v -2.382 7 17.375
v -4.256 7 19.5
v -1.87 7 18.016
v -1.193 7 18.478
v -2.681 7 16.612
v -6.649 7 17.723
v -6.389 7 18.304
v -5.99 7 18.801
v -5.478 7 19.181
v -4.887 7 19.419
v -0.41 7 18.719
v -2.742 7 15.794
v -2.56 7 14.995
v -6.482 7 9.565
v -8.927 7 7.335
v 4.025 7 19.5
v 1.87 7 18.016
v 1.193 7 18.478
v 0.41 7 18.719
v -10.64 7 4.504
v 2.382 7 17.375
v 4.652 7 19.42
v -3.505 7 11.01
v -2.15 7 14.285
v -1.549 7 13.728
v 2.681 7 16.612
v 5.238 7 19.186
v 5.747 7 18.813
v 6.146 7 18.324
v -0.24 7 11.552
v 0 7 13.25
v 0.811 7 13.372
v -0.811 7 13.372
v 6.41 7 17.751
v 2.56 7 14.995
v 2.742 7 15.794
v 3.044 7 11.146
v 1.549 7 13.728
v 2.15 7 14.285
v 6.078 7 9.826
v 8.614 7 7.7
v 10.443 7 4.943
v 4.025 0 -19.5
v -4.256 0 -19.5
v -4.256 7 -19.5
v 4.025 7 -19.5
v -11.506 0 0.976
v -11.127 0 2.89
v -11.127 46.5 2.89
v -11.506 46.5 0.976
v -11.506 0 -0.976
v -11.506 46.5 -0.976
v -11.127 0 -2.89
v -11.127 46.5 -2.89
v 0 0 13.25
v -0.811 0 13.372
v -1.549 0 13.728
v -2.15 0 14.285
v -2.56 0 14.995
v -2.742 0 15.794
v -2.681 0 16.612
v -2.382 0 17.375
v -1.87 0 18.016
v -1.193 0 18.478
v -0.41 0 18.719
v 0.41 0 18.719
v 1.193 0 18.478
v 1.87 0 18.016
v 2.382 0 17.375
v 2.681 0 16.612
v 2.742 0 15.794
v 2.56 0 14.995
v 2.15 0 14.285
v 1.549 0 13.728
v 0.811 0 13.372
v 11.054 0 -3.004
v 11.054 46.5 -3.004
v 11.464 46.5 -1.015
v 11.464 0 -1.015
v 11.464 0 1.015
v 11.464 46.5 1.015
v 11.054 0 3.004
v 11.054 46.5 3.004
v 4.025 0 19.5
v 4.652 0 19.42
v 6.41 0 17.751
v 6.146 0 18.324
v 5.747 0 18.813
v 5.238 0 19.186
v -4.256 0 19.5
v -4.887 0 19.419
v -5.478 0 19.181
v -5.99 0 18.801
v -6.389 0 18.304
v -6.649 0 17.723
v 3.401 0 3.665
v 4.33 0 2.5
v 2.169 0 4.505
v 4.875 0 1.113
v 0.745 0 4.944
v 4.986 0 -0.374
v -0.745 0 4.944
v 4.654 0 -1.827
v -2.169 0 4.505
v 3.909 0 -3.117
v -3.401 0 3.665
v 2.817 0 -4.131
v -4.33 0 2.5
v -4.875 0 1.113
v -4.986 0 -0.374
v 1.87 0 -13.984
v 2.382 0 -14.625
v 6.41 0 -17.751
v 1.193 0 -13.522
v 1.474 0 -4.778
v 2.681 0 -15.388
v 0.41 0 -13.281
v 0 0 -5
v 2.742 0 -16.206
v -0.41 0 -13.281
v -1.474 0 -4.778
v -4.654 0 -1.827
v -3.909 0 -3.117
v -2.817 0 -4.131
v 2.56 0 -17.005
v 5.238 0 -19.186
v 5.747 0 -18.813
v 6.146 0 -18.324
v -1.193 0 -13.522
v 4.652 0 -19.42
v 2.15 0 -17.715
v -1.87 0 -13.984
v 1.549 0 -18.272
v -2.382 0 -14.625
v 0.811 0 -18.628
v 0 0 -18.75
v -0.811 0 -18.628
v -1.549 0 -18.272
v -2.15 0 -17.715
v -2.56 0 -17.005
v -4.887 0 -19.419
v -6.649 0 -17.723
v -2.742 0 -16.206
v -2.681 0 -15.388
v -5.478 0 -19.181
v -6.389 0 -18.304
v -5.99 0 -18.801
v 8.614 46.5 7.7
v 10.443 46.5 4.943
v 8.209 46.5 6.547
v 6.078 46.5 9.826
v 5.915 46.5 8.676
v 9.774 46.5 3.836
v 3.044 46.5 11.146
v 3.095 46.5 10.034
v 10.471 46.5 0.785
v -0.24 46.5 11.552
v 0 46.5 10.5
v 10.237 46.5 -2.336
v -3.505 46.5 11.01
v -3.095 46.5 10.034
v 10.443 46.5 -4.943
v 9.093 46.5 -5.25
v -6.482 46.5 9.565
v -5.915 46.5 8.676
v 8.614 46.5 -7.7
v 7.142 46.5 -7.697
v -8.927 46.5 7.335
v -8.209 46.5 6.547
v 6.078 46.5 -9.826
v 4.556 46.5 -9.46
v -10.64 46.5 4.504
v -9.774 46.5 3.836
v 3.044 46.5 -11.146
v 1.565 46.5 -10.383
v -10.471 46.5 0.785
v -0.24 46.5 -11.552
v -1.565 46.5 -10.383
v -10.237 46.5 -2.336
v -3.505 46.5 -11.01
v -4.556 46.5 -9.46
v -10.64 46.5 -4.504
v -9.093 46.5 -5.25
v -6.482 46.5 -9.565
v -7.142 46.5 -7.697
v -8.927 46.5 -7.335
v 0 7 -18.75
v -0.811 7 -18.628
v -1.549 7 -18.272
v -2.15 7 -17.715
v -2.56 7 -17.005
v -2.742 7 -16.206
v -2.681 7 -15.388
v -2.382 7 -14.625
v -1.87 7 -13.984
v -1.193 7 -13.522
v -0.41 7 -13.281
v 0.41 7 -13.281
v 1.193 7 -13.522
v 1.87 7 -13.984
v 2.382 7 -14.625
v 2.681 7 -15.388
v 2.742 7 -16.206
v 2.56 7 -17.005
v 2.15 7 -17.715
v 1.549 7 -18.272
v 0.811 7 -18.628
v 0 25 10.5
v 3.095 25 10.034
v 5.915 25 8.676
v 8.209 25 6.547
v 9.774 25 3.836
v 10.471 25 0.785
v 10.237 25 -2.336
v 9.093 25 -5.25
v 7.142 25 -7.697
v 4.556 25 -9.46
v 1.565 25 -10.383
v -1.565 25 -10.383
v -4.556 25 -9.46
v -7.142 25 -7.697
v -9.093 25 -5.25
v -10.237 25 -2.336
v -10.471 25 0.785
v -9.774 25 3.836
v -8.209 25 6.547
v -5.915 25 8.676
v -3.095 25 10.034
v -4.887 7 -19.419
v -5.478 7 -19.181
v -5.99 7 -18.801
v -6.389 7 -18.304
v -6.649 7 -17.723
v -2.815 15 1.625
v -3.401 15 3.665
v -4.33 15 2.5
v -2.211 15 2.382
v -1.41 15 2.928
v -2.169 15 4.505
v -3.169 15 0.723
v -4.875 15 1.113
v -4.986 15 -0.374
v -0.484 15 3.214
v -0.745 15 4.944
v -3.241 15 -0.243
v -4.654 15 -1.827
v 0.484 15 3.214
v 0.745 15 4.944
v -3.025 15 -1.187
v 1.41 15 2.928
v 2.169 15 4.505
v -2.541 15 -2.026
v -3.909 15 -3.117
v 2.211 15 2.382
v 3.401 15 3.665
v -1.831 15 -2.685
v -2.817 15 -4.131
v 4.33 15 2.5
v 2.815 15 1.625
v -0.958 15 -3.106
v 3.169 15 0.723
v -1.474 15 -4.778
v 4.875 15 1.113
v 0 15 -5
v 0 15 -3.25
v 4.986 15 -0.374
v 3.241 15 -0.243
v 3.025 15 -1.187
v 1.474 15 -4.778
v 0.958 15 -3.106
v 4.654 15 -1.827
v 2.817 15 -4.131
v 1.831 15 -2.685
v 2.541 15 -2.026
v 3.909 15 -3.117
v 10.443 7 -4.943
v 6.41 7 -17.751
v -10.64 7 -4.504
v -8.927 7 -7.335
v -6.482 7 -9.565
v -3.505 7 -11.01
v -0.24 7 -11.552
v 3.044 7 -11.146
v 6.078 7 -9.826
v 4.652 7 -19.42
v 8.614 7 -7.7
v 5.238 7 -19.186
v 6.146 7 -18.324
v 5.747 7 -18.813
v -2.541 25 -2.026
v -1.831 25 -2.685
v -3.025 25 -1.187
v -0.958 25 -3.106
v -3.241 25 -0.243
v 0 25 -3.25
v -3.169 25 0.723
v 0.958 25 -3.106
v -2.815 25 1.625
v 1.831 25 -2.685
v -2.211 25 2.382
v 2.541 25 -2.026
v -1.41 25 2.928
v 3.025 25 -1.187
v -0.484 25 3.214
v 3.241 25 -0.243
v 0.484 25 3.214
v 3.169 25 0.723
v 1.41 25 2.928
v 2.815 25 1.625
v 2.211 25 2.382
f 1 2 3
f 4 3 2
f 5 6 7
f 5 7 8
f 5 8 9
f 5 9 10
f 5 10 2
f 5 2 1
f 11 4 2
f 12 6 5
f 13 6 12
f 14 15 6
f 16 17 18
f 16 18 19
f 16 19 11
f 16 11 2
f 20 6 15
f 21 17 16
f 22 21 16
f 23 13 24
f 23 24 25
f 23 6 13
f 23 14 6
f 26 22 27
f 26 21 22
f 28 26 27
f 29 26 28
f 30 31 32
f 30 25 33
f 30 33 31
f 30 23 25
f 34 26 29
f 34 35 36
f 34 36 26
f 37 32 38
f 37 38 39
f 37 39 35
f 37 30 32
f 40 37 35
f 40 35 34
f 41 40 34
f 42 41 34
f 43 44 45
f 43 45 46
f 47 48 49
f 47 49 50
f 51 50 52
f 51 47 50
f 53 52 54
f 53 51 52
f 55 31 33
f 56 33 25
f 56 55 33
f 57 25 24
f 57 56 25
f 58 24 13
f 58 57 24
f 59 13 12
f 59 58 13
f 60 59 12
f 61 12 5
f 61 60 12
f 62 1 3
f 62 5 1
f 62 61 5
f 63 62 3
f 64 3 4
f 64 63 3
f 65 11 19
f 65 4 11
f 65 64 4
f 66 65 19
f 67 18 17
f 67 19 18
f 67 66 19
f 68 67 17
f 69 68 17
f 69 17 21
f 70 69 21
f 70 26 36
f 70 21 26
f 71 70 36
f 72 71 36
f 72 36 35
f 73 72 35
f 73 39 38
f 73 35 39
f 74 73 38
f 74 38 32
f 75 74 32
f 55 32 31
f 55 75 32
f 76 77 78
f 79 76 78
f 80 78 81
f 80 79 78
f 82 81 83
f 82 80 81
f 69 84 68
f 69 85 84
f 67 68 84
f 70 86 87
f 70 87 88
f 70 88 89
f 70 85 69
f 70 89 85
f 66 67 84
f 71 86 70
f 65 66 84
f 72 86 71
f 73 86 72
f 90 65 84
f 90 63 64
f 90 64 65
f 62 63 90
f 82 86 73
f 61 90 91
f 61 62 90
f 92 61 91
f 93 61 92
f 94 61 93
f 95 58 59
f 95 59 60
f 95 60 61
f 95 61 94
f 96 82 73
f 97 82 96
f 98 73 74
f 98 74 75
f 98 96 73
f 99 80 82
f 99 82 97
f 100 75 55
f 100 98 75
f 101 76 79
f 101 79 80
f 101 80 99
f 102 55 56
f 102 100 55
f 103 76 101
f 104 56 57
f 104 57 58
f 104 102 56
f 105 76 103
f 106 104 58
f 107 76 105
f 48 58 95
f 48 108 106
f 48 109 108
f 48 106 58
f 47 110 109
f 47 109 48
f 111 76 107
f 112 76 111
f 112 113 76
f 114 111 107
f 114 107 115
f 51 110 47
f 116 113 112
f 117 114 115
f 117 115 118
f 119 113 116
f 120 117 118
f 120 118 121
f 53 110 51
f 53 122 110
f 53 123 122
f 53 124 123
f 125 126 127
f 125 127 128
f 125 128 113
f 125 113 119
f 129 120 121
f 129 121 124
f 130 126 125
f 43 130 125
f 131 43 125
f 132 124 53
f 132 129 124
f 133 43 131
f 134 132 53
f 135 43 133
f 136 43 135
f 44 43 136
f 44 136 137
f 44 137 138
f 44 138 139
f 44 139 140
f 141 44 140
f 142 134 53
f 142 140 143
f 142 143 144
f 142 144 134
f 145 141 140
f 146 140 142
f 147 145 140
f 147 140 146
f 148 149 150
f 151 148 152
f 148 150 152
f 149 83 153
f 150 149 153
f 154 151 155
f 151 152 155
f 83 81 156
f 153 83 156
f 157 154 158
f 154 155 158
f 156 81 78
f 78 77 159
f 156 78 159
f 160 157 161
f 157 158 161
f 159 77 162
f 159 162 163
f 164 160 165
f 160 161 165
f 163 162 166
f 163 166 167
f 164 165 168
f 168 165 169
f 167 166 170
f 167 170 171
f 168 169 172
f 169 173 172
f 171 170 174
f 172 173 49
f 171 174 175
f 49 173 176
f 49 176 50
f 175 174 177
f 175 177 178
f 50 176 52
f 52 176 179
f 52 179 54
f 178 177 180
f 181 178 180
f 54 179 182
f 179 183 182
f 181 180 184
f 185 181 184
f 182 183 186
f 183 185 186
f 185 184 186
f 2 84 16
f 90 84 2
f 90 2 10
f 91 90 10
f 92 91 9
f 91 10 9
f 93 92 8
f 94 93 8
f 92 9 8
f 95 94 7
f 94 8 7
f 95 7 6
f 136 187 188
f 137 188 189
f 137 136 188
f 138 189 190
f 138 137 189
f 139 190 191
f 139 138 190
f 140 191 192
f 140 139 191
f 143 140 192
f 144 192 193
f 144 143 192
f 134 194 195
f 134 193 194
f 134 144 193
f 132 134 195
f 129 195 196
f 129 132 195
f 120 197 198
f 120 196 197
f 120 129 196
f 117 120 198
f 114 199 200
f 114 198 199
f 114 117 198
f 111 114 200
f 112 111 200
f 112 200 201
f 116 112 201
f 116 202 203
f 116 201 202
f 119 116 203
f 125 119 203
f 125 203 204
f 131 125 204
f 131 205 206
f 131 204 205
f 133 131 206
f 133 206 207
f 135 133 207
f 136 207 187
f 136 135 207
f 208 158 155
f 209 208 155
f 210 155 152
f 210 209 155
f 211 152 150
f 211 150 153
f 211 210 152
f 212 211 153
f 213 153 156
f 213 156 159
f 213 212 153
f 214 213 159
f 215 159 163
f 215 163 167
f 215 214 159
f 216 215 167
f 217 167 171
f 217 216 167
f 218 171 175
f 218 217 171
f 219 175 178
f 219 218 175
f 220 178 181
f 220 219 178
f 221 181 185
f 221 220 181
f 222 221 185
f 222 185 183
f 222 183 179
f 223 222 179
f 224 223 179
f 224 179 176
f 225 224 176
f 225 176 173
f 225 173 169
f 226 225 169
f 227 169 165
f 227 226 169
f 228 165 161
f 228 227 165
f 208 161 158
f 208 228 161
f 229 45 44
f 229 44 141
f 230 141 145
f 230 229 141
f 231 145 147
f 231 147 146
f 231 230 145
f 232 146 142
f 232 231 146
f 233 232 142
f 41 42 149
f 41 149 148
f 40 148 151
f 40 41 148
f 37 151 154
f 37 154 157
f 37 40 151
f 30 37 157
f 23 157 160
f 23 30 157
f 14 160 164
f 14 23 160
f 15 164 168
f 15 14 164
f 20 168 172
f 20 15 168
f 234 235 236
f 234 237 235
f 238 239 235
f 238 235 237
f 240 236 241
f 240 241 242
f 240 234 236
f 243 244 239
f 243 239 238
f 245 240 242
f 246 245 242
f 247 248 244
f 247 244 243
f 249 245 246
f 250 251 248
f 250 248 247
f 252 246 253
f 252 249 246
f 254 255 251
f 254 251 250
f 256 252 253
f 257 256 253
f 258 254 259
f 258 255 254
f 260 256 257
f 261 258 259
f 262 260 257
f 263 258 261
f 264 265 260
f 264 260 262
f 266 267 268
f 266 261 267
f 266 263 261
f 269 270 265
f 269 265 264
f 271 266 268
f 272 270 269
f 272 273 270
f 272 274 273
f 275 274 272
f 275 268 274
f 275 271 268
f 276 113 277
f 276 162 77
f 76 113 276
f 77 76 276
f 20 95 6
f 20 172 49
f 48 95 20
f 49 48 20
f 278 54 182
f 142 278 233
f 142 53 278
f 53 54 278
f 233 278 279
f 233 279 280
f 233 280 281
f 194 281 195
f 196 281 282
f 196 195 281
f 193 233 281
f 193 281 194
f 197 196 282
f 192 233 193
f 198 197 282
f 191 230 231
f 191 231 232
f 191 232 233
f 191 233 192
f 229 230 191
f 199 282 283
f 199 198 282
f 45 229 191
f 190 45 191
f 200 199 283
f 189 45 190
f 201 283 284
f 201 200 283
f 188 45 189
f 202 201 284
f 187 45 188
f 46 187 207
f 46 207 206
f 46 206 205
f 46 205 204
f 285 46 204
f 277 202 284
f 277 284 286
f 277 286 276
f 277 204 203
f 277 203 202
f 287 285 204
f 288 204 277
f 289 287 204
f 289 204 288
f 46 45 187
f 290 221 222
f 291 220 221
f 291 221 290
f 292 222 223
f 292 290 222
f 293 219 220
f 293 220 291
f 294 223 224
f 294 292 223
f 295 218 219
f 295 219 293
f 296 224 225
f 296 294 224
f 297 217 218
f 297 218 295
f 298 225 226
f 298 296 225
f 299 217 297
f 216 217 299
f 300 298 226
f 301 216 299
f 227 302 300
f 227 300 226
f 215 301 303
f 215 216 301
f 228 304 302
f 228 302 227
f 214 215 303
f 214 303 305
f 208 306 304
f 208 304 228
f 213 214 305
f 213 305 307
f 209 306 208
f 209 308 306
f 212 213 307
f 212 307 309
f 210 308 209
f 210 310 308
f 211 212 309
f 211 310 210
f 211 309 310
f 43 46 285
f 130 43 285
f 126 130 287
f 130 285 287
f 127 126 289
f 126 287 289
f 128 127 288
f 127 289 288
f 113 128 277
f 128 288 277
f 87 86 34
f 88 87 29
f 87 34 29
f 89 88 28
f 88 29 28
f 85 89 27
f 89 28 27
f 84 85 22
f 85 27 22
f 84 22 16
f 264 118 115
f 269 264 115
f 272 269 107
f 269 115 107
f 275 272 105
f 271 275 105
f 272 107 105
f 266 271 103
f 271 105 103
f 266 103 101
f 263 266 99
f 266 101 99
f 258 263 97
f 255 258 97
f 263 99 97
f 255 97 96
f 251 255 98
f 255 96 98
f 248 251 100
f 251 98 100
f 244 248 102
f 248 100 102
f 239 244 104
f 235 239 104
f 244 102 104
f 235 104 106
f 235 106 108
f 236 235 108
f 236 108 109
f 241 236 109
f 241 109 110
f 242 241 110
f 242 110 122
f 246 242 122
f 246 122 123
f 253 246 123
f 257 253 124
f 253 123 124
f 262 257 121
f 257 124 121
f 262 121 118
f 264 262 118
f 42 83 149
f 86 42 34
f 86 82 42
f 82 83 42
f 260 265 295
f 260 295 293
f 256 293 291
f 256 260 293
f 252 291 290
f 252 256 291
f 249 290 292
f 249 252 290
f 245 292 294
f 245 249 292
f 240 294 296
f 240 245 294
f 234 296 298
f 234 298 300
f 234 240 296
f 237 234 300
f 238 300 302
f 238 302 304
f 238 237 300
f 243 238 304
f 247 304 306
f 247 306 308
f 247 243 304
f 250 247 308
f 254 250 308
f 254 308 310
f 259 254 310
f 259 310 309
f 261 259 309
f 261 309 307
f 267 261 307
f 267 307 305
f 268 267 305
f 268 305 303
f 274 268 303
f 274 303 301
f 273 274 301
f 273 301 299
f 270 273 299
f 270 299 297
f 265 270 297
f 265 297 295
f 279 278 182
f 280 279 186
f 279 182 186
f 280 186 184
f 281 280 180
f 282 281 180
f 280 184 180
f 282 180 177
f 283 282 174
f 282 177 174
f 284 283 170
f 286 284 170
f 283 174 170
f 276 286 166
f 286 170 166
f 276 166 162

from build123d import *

# Parameters (mm, degrees)
SKETCH_1_R          = 2.75
SKETCH_1_R_2        = 3.25
EXTRUDE_1_DEPTH     = 46.5
CUT_EXTRUDE_START   = -21.5
SKETCH_2_R          = 10.5
SKETCH_2_R_2        = 3.25
SKETCH_2_R_3        = 2.75
CUT_EXTRUDE_1_DEPTH = 21.5
SKETCH_4_R          = 5
CUT_EXTRUDE_3_DEPTH = 15
CUT_EXTRUDE_START_2 = -13
CUT_EXTRUDE_4_DEPTH = 13
FILLET_1_R          = 2.5
CUT_EXTRUDE_5_DEPTH = 5


with BuildPart() as part:
    # 草图1 → 凸台-拉伸1 (new body)
    with BuildSketch(Plane(origin=(0, 0, 0), x_dir=(1, 0, 0), z_dir=(0, 1, 0))):
        with BuildLine():
            Line((-6.112211857, 19.5), (5.859179501, 19.5))
            Line((5.859179501, 19.5), (11.054087418, 3.00371837))
            ThreePointArc((11.054087418, 3.00371837), (11.515865574, 0), (11.054087418, -3.00371837))
            Line((11.054087418, -3.00371837), (5.859179501, -19.5))
            Line((5.859179501, -19.5), (-6.112211857, -19.5))
            Line((-6.112211857, -19.5), (-11.127250475, -2.890493903))
            ThreePointArc((-11.127250475, -2.890493903), (-11.554108619, 0), (-11.127250475, 2.890493903))
            Line((-11.127250475, 2.890493903), (-6.112211857, 19.5))
        make_face()
        with Locations(Location((0, 16, 0), (0, 0, 90))):
            Circle(SKETCH_1_R, mode=Mode.SUBTRACT)
        with Locations(Location((0, 0, 0), (0, 0, 90))):
            Circle(SKETCH_1_R_2, mode=Mode.SUBTRACT)
        with Locations(Location((0, -16, 0), (0, 0, 90))):
            Circle(SKETCH_1_R, mode=Mode.SUBTRACT)
    extrude(amount=EXTRUDE_1_DEPTH)

    # 草图2 → 切除-拉伸1 (cut)
    # profile 1 of 3: a face of its own
    with BuildSketch(Plane(origin=(0, 46.5, 0), x_dir=(1, 0, 0), z_dir=(0, 1, 0)).offset(CUT_EXTRUDE_START)):
        with Locations(Location((0, 0, 0), (0, 0, 270))):
            Circle(SKETCH_2_R)
        with Locations(Location((0, 0, 0), (0, 0, 90))):
            Circle(SKETCH_2_R_2, mode=Mode.SUBTRACT)
    # profile 2 of 3: a face of its own
    with BuildSketch(Plane(origin=(0, 46.5, 0), x_dir=(1, 0, 0), z_dir=(0, 1, 0)).offset(CUT_EXTRUDE_START)):
        with BuildLine():
            Line((-6.112211857, 19.5), (-10.640039201, 4.504108324))
            ThreePointArc((-10.640039201, 4.504108324), (-0.240464733, 11.551606066), (10.443383029, 4.942992707))
            Line((10.443383029, 4.942992707), (5.859179501, 19.5))
            Line((5.859179501, 19.5), (-6.112211857, 19.5))
        make_face()
        with Locations(Location((0, 16, 0), (0, 0, 90))):
            Circle(SKETCH_2_R_3, mode=Mode.SUBTRACT)
    # profile 3 of 3: a face of its own
    with BuildSketch(Plane(origin=(0, 46.5, 0), x_dir=(1, 0, 0), z_dir=(0, 1, 0)).offset(CUT_EXTRUDE_START)):
        with BuildLine():
            Line((-6.112211857, -19.5), (5.859179501, -19.5))
            Line((5.859179501, -19.5), (10.443383029, -4.942992707))
            ThreePointArc((10.443383029, -4.942992707), (-0.240464733, -11.551606066), (-10.640039201, -4.504108324))
            Line((-10.640039201, -4.504108324), (-6.112211857, -19.5))
        make_face()
        with Locations(Location((0, -16, 0), (0, 0, 90))):
            Circle(SKETCH_2_R_3, mode=Mode.SUBTRACT)
    extrude(amount=CUT_EXTRUDE_1_DEPTH, mode=Mode.SUBTRACT)

    # 草图4 → 切除-拉伸3 (cut)
    with BuildSketch(Plane.XZ):
        with Locations(Location((0, 0, 0), (0, 0, 270))):
            Circle(SKETCH_4_R)
    extrude(amount=-CUT_EXTRUDE_3_DEPTH, mode=Mode.SUBTRACT)

    # 草图5 → 切除-拉伸4 (cut)
    with BuildSketch(Plane(origin=(0, 25, 0), x_dir=(1, 0, 0), z_dir=(0, 1, 0)).offset(CUT_EXTRUDE_START_2)):
        with BuildLine():
            Line((10.443383029, 4.942992707), (5.859179501, 19.5))
            Line((5.859179501, 19.5), (-6.112211857, 19.5))
            Line((-6.112211857, 19.5), (-10.640039201, 4.504108324))
            ThreePointArc((-10.640039201, 4.504108324), (-0.240464733, 11.551606066), (10.443383029, 4.942992707))
        make_face()
        with BuildLine():
            Line((-10.640039201, -4.504108324), (-6.112211857, -19.5))
            Line((-6.112211857, -19.5), (5.859179501, -19.5))
            Line((5.859179501, -19.5), (10.443383029, -4.942992707))
            ThreePointArc((10.443383029, -4.942992707), (-0.240464733, -11.551606066), (-10.640039201, -4.504108324))
        make_face()
    extrude(amount=CUT_EXTRUDE_4_DEPTH, mode=Mode.SUBTRACT)

    # 圆角1
    fillet_1_edges = [part.edges().sort_by_distance(p)[0] for p in [
        (5.859179501, 6, 19.5),
        (-6.112211857, 6, 19.5),
        (-6.112211857, 6, -19.5),
        (5.859179501, 6, -19.5),
    ]]
    fillet(fillet_1_edges, radius=FILLET_1_R)

    # 草图6 → 切除-拉伸5 (cut)
    with BuildSketch(Plane(origin=(0, 12, 0), x_dir=(1, 0, 0), z_dir=(0, 1, 0))):
        with BuildLine():
            Line((10.443383029, 4.942992707), (6.409986035, 17.750929593))
            ThreePointArc((6.409986035, 17.750929593), (5.504057643, 19.015852671), (4.025430574, 19.5))
            Line((4.025430574, 19.5), (-4.255583645, 19.5))
            ThreePointArc((-4.255583645, 19.5), (-5.74612739, 19.007057385), (-6.648869109, 17.722623476))
            Line((-6.648869109, 17.722623476), (-10.640039201, 4.504108324))
            ThreePointArc((-10.640039201, 4.504108324), (-0.240464733, 11.551606066), (10.443383029, 4.942992707))
        make_face()
        with BuildLine():
            Line((-10.640039201, -4.504108324), (-6.648869109, -17.722623476))
            ThreePointArc((-6.648869109, -17.722623476), (-5.74612739, -19.007057385), (-4.255583645, -19.5))
            Line((-4.255583645, -19.5), (4.025430574, -19.5))
            ThreePointArc((4.025430574, -19.5), (5.504057643, -19.015852671), (6.409986035, -17.750929593))
            Line((6.409986035, -17.750929593), (10.443383029, -4.942992707))
            ThreePointArc((10.443383029, -4.942992707), (-0.240464733, -11.551606066), (-10.640039201, -4.504108324))
        make_face()
    extrude(amount=-CUT_EXTRUDE_5_DEPTH, mode=Mode.SUBTRACT)


solid = part.part
